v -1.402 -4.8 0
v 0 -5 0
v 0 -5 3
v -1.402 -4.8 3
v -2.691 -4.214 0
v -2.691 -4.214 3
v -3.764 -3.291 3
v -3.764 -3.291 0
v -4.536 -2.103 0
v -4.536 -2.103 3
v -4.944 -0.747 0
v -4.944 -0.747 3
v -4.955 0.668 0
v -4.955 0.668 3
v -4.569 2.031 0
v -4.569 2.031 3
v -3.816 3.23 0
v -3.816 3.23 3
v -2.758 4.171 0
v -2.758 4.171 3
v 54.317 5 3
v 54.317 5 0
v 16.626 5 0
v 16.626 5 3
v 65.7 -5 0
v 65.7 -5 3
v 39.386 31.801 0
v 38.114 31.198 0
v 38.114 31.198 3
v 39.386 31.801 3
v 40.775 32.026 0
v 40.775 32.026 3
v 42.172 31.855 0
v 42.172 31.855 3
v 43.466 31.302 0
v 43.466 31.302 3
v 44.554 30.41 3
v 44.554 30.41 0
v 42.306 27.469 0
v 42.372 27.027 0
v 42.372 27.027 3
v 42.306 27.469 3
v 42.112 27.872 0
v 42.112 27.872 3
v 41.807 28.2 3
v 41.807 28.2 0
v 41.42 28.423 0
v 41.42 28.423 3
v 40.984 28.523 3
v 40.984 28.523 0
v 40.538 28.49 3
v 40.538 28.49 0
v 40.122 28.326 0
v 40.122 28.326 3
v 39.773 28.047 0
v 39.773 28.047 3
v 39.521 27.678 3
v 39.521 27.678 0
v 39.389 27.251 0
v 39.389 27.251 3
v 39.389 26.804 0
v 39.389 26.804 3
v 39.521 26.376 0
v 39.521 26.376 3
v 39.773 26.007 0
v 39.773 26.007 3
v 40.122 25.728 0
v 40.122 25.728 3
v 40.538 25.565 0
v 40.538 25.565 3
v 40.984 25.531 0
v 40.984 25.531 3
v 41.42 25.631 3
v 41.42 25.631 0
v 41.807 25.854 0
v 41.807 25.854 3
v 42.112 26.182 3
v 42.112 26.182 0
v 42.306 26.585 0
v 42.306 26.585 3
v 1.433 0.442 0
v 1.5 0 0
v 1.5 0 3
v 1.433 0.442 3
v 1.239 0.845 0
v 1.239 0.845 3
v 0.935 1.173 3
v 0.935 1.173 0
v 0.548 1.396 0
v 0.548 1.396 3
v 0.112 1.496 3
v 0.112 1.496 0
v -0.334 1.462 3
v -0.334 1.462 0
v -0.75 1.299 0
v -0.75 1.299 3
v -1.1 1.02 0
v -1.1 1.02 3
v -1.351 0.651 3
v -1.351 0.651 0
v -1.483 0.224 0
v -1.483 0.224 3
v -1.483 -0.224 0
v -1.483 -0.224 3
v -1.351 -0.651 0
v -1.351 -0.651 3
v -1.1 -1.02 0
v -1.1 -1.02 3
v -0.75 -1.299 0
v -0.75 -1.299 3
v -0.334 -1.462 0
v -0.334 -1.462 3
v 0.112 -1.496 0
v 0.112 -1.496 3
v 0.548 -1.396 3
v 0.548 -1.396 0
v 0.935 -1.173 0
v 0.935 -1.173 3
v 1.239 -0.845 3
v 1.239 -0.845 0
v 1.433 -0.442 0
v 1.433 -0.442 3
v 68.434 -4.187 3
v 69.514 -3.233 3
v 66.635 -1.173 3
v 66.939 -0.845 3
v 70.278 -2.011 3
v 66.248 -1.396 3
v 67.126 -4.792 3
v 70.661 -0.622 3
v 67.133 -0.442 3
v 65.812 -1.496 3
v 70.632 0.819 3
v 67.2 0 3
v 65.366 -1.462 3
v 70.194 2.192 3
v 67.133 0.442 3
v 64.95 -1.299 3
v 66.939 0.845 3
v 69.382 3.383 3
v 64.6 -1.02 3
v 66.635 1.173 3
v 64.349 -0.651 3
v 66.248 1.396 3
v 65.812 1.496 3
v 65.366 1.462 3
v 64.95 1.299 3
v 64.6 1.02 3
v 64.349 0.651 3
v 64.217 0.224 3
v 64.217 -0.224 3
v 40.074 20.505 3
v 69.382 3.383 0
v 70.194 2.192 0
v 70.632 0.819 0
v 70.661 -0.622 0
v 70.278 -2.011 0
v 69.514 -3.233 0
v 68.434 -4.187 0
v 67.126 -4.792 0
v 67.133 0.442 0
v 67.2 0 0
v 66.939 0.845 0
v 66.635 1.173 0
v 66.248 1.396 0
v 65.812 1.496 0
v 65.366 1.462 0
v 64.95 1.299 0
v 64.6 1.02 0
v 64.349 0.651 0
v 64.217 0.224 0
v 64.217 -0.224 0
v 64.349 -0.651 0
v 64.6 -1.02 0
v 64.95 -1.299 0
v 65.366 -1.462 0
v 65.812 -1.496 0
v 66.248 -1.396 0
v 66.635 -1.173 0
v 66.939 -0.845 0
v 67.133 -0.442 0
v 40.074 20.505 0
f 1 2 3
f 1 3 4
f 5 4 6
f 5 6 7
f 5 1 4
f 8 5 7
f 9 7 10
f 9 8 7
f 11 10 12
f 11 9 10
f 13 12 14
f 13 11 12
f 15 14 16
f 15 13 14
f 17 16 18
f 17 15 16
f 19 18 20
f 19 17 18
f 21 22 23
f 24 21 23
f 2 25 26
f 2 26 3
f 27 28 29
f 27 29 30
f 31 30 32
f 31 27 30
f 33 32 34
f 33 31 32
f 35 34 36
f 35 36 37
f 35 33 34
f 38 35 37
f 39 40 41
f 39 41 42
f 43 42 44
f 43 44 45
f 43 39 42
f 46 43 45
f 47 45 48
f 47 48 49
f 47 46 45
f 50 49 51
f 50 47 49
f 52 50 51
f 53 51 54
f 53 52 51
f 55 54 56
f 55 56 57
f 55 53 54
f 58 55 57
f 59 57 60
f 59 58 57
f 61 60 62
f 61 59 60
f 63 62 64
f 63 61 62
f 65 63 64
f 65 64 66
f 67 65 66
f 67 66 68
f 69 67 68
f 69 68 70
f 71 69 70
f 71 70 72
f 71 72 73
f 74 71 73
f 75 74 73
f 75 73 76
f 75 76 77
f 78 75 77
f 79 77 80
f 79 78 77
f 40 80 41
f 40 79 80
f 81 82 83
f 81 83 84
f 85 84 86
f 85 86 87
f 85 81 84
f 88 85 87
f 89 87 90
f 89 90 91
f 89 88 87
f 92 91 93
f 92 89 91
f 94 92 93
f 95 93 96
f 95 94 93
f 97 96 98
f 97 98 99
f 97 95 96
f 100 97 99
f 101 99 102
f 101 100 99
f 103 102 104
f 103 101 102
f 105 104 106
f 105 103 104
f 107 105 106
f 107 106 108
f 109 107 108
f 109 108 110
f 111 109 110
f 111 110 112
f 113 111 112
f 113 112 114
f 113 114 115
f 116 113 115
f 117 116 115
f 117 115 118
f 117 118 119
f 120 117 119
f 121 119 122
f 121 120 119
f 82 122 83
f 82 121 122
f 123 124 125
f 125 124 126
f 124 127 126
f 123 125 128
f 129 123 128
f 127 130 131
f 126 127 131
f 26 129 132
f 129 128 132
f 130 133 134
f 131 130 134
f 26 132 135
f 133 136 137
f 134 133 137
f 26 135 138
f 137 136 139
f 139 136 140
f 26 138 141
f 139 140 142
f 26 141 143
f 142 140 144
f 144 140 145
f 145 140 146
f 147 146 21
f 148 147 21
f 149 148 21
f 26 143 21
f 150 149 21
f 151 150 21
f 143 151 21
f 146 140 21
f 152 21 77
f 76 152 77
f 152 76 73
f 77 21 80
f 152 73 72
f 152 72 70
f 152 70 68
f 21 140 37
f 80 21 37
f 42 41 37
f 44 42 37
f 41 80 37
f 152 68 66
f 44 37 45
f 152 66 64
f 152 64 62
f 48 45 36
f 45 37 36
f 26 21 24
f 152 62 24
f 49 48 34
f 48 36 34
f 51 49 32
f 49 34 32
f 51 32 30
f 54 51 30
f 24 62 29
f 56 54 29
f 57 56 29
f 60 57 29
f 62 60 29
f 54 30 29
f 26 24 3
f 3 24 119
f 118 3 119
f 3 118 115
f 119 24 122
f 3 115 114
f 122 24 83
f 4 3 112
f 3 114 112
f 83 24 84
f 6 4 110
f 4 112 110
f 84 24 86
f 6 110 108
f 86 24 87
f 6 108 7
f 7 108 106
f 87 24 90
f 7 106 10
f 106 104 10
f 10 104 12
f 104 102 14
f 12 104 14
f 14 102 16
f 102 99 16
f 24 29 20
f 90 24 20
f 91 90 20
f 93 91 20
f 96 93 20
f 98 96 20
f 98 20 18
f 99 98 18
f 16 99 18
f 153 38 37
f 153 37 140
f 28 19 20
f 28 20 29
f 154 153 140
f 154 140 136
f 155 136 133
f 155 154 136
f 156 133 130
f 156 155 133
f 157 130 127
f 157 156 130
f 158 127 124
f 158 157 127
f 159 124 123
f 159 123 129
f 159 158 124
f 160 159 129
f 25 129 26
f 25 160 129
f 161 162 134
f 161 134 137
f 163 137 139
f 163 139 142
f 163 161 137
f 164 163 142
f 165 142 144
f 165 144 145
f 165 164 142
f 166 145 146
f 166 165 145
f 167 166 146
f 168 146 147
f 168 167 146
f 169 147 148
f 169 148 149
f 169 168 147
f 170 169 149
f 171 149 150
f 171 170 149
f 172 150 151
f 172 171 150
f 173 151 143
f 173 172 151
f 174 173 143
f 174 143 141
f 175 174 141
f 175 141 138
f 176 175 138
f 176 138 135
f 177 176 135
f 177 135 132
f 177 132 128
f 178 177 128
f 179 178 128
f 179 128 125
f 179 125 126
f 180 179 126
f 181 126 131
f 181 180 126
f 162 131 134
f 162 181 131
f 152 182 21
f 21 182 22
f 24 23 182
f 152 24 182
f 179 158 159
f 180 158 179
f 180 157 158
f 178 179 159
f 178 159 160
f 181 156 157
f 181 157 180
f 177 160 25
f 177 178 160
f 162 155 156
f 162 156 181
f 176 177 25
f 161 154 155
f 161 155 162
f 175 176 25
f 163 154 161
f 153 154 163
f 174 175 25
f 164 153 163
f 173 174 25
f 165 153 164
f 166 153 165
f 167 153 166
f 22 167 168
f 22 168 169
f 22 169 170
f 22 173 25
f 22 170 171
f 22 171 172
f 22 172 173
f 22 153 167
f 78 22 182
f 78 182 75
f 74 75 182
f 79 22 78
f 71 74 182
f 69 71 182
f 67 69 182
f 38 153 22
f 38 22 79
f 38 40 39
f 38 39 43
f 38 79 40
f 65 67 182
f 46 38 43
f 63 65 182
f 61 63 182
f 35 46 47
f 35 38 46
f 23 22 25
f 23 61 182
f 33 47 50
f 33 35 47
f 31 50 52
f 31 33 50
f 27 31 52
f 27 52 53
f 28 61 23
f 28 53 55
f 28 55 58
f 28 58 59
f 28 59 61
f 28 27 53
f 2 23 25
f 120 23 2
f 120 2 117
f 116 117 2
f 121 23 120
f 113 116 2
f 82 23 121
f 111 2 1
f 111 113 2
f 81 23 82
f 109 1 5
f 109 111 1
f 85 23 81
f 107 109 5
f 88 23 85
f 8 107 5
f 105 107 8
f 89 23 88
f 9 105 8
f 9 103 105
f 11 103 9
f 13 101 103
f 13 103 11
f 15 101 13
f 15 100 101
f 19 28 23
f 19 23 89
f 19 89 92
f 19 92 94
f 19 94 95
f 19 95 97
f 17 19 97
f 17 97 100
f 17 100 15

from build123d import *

# Parameters (mm, degrees)
SKETCH1_R           = 1.5
BOSS_EXTRUDE1_DEPTH = 3


with BuildPart() as part:
    # Sketch1 → Boss-Extrude1 (new body)
    with BuildSketch(Plane.XY):
        with BuildLine():
            Line((-2.757874024, 4.170627155), (38.114272094, 31.197792594))
            ThreePointArc((38.114272094, 31.197792594), (41.479478747, 31.990143081), (44.554321247, 30.409706839))
            Line((44.554321247, 30.409706839), (69.382175128, 3.382541401))
            ThreePointArc((69.382175128, 3.382541401), (70.277810995, -2.01088202), (65.7, -5))
            Line((65.7, -5), (0, -5))
            ThreePointArc((0, -5), (-4.788169576, -1.439941705), (-2.757874024, 4.170627155))
        make_face()
        with Locations((40.872146119, 27.027165439)):
            Circle(SKETCH1_R, mode=Mode.SUBTRACT)
        Circle(SKETCH1_R, mode=Mode.SUBTRACT)
        with Locations((65.7, 0)):
            Circle(SKETCH1_R, mode=Mode.SUBTRACT)
        Polygon((40.074023256, 20.505095423), (54.317405325, 5), (16.626261885, 5), align=None, mode=Mode.SUBTRACT)
    extrude(amount=BOSS_EXTRUDE1_DEPTH)


solid = part.part
